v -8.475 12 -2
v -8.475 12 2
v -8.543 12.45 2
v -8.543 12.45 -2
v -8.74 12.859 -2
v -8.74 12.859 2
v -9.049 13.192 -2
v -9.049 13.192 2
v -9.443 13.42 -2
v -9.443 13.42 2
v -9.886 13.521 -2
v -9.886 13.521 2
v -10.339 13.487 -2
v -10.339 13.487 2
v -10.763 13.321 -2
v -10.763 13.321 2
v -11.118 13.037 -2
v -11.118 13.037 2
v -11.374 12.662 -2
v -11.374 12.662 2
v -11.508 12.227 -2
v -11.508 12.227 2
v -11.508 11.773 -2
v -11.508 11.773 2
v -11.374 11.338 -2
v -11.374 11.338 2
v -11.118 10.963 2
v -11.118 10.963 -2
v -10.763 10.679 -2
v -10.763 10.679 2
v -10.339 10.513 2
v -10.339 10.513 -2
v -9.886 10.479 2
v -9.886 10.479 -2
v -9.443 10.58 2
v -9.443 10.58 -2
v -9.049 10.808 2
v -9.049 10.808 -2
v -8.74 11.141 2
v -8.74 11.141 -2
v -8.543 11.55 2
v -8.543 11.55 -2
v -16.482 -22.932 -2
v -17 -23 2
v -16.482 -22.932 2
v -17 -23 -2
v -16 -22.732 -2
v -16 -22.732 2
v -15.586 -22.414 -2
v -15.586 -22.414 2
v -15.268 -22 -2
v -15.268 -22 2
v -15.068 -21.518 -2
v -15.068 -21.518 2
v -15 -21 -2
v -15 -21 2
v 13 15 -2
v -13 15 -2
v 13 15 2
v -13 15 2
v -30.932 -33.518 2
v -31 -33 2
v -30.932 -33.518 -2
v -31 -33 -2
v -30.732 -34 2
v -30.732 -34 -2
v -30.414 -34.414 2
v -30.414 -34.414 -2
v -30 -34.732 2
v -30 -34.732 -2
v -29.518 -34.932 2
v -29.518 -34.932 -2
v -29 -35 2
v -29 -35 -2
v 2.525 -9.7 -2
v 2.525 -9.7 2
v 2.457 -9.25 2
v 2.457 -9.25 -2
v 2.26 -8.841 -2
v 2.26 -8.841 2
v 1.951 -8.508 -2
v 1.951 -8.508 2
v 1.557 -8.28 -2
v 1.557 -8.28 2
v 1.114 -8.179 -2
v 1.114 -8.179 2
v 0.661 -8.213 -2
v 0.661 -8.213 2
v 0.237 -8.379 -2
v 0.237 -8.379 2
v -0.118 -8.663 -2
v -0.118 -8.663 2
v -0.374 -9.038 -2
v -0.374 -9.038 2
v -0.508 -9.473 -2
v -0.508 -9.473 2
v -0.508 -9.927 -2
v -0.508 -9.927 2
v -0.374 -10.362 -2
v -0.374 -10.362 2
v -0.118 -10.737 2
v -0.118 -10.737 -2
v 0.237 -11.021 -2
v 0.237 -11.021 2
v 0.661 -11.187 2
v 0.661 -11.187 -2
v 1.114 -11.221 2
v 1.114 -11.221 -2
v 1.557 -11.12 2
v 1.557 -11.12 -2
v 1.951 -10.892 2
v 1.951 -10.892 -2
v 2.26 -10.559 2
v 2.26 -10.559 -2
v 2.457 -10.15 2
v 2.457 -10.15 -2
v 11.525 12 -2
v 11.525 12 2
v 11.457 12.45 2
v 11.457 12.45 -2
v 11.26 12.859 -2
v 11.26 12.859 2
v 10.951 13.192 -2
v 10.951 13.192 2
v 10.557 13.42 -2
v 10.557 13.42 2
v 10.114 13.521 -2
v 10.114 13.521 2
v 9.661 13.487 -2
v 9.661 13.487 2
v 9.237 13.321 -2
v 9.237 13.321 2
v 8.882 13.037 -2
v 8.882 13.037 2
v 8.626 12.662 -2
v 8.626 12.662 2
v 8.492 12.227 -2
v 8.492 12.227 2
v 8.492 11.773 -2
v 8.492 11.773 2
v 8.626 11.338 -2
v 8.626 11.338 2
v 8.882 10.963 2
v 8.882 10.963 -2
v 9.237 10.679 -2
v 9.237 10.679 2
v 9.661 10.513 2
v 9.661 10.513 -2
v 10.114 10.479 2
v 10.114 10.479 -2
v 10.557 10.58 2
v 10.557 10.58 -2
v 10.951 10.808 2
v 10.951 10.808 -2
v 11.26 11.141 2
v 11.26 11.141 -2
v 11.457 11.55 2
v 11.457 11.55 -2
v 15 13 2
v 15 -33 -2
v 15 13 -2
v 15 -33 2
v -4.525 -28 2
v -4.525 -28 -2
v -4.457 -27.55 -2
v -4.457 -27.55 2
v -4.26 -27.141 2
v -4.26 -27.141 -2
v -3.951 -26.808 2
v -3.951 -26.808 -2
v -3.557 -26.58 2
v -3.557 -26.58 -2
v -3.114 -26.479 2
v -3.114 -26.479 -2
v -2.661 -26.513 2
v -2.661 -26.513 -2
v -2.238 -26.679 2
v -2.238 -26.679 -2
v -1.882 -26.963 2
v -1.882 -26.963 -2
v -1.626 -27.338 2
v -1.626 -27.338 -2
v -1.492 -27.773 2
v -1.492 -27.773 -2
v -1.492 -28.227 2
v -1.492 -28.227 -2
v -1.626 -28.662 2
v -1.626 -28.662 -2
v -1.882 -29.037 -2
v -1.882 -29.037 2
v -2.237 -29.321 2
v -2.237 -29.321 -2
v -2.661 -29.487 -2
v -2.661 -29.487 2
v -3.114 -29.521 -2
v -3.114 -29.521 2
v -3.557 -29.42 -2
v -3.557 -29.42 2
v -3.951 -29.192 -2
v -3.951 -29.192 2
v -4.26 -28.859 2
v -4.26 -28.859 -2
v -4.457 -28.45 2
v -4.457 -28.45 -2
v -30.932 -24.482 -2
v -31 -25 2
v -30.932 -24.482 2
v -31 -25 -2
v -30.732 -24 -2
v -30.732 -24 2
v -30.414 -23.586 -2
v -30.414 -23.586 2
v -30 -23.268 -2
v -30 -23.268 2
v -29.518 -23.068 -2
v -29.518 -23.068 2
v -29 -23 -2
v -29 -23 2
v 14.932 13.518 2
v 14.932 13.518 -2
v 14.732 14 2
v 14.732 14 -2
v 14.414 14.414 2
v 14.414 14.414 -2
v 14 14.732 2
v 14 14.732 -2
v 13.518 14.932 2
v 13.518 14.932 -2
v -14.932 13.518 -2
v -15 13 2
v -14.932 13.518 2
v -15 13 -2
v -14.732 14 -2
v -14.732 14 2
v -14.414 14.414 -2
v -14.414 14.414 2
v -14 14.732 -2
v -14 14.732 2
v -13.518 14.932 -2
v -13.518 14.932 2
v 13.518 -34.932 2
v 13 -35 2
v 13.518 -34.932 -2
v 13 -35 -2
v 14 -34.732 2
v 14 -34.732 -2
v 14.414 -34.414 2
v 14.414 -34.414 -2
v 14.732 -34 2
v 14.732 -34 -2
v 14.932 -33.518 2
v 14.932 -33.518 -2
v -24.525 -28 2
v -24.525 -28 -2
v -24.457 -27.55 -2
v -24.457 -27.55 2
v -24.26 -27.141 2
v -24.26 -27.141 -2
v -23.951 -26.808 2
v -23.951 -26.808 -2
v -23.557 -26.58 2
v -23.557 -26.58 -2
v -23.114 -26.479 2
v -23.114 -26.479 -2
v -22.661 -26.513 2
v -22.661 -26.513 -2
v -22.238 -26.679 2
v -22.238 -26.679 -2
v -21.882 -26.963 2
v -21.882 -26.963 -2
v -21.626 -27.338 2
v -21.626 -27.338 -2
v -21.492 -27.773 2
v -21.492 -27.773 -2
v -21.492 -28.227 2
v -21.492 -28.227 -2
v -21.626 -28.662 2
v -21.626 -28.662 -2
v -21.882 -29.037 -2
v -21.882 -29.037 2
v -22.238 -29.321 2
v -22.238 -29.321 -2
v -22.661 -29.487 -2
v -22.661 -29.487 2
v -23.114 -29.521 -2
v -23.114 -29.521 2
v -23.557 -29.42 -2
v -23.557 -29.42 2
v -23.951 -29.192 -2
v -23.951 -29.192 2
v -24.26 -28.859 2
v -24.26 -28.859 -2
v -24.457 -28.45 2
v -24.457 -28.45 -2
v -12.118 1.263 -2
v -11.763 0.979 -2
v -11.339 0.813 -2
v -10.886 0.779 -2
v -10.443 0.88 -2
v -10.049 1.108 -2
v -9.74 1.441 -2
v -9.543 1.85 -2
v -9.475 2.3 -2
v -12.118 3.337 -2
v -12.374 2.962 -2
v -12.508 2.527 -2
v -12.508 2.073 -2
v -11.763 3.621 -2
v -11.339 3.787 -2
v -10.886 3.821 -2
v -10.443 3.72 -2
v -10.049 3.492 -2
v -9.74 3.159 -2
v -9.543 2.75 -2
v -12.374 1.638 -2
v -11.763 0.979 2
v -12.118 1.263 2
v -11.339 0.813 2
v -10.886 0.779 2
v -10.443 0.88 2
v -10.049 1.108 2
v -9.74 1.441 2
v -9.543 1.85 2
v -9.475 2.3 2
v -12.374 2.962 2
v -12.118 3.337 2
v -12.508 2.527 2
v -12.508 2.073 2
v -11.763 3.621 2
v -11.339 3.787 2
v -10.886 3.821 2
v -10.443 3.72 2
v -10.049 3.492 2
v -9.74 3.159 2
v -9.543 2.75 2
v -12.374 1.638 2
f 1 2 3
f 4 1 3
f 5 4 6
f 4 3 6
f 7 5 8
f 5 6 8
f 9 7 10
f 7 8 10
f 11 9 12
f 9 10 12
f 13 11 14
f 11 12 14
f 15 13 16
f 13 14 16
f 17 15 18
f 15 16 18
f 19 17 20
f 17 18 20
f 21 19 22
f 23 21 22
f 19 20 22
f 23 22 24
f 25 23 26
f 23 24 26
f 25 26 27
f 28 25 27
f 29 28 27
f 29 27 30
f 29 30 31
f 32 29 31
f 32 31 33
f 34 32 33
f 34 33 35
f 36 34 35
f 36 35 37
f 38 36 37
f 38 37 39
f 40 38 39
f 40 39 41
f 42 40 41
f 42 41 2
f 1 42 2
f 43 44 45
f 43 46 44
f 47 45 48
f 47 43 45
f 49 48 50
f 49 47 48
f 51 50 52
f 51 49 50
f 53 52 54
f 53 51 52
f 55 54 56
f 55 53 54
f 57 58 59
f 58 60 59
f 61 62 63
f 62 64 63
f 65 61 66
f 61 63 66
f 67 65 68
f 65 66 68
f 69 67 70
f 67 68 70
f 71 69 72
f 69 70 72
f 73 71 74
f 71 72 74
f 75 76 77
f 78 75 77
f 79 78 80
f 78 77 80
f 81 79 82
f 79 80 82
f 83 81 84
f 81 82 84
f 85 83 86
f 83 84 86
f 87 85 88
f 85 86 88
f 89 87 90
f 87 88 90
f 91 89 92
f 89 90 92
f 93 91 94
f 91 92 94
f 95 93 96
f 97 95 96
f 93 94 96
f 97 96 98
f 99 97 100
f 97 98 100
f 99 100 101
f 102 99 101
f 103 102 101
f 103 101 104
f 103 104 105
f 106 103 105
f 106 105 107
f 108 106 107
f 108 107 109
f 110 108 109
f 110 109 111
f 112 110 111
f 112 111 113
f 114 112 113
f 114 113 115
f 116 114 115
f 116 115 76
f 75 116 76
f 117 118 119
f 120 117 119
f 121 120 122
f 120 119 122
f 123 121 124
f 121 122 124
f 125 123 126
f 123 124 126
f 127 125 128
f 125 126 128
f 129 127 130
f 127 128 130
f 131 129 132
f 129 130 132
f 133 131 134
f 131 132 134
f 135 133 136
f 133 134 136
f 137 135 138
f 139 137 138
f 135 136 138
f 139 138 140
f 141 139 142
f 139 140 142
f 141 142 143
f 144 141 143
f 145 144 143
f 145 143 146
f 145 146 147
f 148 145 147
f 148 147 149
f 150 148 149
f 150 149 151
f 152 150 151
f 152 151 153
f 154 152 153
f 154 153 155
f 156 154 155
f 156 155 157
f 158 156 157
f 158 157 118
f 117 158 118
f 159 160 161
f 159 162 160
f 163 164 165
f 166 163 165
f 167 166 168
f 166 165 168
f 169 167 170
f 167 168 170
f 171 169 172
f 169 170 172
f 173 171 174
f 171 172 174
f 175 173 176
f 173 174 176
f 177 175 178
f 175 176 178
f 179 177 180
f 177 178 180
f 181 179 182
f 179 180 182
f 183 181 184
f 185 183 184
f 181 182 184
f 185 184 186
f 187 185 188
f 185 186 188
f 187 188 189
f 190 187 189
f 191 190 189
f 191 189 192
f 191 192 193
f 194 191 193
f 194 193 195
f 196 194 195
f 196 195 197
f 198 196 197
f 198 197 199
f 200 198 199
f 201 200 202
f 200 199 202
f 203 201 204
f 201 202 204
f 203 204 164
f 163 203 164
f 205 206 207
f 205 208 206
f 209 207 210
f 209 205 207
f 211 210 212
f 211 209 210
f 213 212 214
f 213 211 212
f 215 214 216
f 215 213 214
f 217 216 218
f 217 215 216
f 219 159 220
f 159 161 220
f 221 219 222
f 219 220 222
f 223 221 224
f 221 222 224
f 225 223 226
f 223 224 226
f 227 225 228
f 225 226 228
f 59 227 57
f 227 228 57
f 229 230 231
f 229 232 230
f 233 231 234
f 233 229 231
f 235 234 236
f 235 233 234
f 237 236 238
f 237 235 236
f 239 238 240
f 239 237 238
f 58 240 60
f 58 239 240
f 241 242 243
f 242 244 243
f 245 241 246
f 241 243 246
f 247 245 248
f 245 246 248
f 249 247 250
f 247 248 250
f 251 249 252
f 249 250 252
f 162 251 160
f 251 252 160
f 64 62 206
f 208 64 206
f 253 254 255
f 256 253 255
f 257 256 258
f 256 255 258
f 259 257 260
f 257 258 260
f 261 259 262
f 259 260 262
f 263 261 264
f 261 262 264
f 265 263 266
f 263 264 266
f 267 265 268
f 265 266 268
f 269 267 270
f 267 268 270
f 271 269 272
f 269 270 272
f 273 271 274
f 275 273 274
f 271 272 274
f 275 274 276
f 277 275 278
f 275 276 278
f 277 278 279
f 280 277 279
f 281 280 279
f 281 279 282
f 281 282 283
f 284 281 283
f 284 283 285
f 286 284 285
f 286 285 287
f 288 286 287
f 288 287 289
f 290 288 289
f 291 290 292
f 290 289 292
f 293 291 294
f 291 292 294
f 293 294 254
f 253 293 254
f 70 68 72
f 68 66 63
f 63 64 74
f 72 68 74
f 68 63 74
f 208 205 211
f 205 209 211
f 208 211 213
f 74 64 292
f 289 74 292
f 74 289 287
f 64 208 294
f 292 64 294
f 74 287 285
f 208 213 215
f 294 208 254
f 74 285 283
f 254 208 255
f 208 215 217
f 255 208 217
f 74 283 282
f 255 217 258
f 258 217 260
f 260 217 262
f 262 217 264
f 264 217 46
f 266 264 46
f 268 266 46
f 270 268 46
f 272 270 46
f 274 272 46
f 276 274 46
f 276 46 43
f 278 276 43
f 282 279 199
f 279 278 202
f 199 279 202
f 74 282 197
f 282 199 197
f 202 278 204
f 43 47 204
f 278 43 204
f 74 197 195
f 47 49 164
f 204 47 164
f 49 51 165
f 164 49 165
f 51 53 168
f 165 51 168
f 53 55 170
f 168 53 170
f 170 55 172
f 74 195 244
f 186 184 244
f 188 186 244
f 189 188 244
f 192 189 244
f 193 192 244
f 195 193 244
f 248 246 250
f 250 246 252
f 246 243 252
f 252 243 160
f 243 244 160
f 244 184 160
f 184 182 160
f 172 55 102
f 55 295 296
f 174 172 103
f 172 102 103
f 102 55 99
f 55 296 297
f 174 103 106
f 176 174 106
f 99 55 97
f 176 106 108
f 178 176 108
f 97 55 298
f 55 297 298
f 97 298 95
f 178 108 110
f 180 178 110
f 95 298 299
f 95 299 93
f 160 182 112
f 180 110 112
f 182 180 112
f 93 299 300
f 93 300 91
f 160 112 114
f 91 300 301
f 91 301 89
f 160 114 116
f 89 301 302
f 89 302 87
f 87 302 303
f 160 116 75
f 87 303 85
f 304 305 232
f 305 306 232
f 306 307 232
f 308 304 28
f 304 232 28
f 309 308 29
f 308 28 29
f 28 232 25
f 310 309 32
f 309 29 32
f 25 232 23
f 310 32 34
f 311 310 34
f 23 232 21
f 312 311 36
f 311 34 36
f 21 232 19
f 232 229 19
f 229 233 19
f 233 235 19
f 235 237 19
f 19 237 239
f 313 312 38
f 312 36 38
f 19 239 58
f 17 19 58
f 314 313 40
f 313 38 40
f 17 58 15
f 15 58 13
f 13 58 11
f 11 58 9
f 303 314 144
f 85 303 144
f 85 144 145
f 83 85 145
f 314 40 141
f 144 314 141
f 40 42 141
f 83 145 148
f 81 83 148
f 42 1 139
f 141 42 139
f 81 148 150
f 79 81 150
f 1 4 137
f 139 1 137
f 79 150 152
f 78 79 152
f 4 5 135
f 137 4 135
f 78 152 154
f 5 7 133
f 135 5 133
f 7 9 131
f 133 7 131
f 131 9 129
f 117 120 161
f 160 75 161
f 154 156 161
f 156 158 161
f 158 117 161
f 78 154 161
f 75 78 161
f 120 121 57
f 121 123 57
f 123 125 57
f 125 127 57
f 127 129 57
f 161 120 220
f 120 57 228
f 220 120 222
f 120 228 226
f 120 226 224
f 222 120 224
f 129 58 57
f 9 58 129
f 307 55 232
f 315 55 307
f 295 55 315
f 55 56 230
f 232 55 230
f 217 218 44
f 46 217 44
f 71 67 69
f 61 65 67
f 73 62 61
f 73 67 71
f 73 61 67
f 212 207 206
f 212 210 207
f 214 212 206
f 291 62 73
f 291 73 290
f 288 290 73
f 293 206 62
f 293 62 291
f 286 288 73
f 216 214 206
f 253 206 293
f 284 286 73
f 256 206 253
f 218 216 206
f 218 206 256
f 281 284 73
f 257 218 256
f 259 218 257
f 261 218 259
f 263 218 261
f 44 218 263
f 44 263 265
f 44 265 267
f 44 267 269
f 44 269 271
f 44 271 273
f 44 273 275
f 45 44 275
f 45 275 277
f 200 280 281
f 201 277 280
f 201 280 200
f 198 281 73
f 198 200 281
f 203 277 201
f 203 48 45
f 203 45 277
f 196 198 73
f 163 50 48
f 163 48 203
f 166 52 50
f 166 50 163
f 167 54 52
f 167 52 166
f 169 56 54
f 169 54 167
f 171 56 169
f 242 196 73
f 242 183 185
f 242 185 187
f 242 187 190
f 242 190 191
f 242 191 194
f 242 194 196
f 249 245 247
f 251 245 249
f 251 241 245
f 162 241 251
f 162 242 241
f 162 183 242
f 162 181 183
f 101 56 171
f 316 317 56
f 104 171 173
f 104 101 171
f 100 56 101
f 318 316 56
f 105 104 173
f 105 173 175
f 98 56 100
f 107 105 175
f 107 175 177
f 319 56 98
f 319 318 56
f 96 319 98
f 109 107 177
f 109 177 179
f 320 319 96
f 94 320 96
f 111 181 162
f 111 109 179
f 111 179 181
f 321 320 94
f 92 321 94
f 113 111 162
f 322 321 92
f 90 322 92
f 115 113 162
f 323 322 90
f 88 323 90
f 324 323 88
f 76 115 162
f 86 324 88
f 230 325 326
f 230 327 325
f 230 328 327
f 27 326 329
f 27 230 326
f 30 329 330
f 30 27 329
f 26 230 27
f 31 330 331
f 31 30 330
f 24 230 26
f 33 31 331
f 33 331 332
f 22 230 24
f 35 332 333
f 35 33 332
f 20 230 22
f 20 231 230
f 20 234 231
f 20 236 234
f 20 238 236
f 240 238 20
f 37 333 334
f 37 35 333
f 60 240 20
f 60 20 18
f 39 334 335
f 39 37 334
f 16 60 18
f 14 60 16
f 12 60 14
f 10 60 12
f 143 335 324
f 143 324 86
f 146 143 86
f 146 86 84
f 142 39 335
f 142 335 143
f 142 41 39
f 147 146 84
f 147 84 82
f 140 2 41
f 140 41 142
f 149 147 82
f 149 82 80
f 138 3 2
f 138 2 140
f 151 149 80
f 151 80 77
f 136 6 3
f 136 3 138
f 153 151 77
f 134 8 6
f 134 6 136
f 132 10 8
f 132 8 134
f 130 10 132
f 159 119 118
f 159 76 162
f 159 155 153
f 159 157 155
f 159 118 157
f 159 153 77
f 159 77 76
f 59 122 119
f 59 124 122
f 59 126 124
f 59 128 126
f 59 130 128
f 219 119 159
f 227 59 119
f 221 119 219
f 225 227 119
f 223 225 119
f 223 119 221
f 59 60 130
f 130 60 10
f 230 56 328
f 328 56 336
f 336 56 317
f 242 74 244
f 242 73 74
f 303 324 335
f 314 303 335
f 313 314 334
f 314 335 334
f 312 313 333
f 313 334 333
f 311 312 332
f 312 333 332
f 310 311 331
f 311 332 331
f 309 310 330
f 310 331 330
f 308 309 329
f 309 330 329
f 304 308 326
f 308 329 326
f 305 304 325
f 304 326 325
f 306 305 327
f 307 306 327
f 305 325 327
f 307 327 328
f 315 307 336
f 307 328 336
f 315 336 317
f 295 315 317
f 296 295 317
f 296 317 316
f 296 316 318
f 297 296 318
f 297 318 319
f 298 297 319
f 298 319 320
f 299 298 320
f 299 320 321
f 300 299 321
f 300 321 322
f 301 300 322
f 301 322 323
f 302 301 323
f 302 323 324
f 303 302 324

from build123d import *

# Parameters (mm, degrees)
SKETCH_2_W          = 30
SKETCH_2_H          = 30
EXTRUDE_1_DEPTH     = 2
SKETCH_3_W          = 30
SKETCH_3_H          = 20
EXTRUDE_2_DEPTH     = 4
SKETCH_6_R          = 1.525
CUT_EXTRUDE_1_DEPTH = 80
SKETCH_7_W          = 16
SKETCH_7_H          = 12
EXTRUDE_3_DEPTH     = 4
SKETCH_9_R          = 1.525
CUT_EXTRUDE_2_DEPTH = 4
FILLET_2_R          = 2


with BuildPart() as part:
    # 草图2 → 凸台-拉伸1 (new body, symmetric)
    with BuildSketch(Plane.XY):
        Rectangle(SKETCH_2_W, SKETCH_2_H)
    extrude(amount=EXTRUDE_1_DEPTH, both=True)

    # 草图3 → 凸台-拉伸2 (add)
    with BuildSketch(Plane.XY.offset(2)):
        with Locations((0, -25)):
            Rectangle(SKETCH_3_W, SKETCH_3_H)
    extrude(amount=-EXTRUDE_2_DEPTH)

    # 草图6 → 切除-拉伸1 (cut)
    with BuildSketch(Plane.XY.offset(2)):
        with Locations((1, -9.7)):
            Circle(SKETCH_6_R)
        with Locations((-11, 2.3)):
            Circle(SKETCH_6_R)
        with Locations((-10, 12)):
            Circle(SKETCH_6_R)
        with Locations((10, 12)):
            Circle(SKETCH_6_R)
    extrude(amount=-CUT_EXTRUDE_1_DEPTH, mode=Mode.SUBTRACT)

    # 草图7 → 凸台-拉伸3 (add)
    with BuildSketch(Plane.XY.offset(2)):
        with Locations((-23, -29)):
            Rectangle(SKETCH_7_W, SKETCH_7_H)
    extrude(amount=-EXTRUDE_3_DEPTH)

    # 草图9 → 切除-拉伸2 (cut)
    with BuildSketch(Plane(origin=(0, 0, -2), x_dir=(-1, 0, 0), z_dir=(0, 0, -1))):
        with Locations((3, -28)):
            Circle(SKETCH_9_R)
        with Locations((23, -28)):
            Circle(SKETCH_9_R)
    extrude(amount=-CUT_EXTRUDE_2_DEPTH, mode=Mode.SUBTRACT)

    # 圆角2
    fillet_2_edges = [part.edges().sort_by_distance(p)[0] for p in [
        (15, -35, 0),
        (-31, -23, 0),
        (-31, -35, 0),
        (-15, -23, 0),
        (-15, 15, 0),
        (15, 15, 0),
    ]]
    fillet(fillet_2_edges, radius=FILLET_2_R)


solid = part.part
